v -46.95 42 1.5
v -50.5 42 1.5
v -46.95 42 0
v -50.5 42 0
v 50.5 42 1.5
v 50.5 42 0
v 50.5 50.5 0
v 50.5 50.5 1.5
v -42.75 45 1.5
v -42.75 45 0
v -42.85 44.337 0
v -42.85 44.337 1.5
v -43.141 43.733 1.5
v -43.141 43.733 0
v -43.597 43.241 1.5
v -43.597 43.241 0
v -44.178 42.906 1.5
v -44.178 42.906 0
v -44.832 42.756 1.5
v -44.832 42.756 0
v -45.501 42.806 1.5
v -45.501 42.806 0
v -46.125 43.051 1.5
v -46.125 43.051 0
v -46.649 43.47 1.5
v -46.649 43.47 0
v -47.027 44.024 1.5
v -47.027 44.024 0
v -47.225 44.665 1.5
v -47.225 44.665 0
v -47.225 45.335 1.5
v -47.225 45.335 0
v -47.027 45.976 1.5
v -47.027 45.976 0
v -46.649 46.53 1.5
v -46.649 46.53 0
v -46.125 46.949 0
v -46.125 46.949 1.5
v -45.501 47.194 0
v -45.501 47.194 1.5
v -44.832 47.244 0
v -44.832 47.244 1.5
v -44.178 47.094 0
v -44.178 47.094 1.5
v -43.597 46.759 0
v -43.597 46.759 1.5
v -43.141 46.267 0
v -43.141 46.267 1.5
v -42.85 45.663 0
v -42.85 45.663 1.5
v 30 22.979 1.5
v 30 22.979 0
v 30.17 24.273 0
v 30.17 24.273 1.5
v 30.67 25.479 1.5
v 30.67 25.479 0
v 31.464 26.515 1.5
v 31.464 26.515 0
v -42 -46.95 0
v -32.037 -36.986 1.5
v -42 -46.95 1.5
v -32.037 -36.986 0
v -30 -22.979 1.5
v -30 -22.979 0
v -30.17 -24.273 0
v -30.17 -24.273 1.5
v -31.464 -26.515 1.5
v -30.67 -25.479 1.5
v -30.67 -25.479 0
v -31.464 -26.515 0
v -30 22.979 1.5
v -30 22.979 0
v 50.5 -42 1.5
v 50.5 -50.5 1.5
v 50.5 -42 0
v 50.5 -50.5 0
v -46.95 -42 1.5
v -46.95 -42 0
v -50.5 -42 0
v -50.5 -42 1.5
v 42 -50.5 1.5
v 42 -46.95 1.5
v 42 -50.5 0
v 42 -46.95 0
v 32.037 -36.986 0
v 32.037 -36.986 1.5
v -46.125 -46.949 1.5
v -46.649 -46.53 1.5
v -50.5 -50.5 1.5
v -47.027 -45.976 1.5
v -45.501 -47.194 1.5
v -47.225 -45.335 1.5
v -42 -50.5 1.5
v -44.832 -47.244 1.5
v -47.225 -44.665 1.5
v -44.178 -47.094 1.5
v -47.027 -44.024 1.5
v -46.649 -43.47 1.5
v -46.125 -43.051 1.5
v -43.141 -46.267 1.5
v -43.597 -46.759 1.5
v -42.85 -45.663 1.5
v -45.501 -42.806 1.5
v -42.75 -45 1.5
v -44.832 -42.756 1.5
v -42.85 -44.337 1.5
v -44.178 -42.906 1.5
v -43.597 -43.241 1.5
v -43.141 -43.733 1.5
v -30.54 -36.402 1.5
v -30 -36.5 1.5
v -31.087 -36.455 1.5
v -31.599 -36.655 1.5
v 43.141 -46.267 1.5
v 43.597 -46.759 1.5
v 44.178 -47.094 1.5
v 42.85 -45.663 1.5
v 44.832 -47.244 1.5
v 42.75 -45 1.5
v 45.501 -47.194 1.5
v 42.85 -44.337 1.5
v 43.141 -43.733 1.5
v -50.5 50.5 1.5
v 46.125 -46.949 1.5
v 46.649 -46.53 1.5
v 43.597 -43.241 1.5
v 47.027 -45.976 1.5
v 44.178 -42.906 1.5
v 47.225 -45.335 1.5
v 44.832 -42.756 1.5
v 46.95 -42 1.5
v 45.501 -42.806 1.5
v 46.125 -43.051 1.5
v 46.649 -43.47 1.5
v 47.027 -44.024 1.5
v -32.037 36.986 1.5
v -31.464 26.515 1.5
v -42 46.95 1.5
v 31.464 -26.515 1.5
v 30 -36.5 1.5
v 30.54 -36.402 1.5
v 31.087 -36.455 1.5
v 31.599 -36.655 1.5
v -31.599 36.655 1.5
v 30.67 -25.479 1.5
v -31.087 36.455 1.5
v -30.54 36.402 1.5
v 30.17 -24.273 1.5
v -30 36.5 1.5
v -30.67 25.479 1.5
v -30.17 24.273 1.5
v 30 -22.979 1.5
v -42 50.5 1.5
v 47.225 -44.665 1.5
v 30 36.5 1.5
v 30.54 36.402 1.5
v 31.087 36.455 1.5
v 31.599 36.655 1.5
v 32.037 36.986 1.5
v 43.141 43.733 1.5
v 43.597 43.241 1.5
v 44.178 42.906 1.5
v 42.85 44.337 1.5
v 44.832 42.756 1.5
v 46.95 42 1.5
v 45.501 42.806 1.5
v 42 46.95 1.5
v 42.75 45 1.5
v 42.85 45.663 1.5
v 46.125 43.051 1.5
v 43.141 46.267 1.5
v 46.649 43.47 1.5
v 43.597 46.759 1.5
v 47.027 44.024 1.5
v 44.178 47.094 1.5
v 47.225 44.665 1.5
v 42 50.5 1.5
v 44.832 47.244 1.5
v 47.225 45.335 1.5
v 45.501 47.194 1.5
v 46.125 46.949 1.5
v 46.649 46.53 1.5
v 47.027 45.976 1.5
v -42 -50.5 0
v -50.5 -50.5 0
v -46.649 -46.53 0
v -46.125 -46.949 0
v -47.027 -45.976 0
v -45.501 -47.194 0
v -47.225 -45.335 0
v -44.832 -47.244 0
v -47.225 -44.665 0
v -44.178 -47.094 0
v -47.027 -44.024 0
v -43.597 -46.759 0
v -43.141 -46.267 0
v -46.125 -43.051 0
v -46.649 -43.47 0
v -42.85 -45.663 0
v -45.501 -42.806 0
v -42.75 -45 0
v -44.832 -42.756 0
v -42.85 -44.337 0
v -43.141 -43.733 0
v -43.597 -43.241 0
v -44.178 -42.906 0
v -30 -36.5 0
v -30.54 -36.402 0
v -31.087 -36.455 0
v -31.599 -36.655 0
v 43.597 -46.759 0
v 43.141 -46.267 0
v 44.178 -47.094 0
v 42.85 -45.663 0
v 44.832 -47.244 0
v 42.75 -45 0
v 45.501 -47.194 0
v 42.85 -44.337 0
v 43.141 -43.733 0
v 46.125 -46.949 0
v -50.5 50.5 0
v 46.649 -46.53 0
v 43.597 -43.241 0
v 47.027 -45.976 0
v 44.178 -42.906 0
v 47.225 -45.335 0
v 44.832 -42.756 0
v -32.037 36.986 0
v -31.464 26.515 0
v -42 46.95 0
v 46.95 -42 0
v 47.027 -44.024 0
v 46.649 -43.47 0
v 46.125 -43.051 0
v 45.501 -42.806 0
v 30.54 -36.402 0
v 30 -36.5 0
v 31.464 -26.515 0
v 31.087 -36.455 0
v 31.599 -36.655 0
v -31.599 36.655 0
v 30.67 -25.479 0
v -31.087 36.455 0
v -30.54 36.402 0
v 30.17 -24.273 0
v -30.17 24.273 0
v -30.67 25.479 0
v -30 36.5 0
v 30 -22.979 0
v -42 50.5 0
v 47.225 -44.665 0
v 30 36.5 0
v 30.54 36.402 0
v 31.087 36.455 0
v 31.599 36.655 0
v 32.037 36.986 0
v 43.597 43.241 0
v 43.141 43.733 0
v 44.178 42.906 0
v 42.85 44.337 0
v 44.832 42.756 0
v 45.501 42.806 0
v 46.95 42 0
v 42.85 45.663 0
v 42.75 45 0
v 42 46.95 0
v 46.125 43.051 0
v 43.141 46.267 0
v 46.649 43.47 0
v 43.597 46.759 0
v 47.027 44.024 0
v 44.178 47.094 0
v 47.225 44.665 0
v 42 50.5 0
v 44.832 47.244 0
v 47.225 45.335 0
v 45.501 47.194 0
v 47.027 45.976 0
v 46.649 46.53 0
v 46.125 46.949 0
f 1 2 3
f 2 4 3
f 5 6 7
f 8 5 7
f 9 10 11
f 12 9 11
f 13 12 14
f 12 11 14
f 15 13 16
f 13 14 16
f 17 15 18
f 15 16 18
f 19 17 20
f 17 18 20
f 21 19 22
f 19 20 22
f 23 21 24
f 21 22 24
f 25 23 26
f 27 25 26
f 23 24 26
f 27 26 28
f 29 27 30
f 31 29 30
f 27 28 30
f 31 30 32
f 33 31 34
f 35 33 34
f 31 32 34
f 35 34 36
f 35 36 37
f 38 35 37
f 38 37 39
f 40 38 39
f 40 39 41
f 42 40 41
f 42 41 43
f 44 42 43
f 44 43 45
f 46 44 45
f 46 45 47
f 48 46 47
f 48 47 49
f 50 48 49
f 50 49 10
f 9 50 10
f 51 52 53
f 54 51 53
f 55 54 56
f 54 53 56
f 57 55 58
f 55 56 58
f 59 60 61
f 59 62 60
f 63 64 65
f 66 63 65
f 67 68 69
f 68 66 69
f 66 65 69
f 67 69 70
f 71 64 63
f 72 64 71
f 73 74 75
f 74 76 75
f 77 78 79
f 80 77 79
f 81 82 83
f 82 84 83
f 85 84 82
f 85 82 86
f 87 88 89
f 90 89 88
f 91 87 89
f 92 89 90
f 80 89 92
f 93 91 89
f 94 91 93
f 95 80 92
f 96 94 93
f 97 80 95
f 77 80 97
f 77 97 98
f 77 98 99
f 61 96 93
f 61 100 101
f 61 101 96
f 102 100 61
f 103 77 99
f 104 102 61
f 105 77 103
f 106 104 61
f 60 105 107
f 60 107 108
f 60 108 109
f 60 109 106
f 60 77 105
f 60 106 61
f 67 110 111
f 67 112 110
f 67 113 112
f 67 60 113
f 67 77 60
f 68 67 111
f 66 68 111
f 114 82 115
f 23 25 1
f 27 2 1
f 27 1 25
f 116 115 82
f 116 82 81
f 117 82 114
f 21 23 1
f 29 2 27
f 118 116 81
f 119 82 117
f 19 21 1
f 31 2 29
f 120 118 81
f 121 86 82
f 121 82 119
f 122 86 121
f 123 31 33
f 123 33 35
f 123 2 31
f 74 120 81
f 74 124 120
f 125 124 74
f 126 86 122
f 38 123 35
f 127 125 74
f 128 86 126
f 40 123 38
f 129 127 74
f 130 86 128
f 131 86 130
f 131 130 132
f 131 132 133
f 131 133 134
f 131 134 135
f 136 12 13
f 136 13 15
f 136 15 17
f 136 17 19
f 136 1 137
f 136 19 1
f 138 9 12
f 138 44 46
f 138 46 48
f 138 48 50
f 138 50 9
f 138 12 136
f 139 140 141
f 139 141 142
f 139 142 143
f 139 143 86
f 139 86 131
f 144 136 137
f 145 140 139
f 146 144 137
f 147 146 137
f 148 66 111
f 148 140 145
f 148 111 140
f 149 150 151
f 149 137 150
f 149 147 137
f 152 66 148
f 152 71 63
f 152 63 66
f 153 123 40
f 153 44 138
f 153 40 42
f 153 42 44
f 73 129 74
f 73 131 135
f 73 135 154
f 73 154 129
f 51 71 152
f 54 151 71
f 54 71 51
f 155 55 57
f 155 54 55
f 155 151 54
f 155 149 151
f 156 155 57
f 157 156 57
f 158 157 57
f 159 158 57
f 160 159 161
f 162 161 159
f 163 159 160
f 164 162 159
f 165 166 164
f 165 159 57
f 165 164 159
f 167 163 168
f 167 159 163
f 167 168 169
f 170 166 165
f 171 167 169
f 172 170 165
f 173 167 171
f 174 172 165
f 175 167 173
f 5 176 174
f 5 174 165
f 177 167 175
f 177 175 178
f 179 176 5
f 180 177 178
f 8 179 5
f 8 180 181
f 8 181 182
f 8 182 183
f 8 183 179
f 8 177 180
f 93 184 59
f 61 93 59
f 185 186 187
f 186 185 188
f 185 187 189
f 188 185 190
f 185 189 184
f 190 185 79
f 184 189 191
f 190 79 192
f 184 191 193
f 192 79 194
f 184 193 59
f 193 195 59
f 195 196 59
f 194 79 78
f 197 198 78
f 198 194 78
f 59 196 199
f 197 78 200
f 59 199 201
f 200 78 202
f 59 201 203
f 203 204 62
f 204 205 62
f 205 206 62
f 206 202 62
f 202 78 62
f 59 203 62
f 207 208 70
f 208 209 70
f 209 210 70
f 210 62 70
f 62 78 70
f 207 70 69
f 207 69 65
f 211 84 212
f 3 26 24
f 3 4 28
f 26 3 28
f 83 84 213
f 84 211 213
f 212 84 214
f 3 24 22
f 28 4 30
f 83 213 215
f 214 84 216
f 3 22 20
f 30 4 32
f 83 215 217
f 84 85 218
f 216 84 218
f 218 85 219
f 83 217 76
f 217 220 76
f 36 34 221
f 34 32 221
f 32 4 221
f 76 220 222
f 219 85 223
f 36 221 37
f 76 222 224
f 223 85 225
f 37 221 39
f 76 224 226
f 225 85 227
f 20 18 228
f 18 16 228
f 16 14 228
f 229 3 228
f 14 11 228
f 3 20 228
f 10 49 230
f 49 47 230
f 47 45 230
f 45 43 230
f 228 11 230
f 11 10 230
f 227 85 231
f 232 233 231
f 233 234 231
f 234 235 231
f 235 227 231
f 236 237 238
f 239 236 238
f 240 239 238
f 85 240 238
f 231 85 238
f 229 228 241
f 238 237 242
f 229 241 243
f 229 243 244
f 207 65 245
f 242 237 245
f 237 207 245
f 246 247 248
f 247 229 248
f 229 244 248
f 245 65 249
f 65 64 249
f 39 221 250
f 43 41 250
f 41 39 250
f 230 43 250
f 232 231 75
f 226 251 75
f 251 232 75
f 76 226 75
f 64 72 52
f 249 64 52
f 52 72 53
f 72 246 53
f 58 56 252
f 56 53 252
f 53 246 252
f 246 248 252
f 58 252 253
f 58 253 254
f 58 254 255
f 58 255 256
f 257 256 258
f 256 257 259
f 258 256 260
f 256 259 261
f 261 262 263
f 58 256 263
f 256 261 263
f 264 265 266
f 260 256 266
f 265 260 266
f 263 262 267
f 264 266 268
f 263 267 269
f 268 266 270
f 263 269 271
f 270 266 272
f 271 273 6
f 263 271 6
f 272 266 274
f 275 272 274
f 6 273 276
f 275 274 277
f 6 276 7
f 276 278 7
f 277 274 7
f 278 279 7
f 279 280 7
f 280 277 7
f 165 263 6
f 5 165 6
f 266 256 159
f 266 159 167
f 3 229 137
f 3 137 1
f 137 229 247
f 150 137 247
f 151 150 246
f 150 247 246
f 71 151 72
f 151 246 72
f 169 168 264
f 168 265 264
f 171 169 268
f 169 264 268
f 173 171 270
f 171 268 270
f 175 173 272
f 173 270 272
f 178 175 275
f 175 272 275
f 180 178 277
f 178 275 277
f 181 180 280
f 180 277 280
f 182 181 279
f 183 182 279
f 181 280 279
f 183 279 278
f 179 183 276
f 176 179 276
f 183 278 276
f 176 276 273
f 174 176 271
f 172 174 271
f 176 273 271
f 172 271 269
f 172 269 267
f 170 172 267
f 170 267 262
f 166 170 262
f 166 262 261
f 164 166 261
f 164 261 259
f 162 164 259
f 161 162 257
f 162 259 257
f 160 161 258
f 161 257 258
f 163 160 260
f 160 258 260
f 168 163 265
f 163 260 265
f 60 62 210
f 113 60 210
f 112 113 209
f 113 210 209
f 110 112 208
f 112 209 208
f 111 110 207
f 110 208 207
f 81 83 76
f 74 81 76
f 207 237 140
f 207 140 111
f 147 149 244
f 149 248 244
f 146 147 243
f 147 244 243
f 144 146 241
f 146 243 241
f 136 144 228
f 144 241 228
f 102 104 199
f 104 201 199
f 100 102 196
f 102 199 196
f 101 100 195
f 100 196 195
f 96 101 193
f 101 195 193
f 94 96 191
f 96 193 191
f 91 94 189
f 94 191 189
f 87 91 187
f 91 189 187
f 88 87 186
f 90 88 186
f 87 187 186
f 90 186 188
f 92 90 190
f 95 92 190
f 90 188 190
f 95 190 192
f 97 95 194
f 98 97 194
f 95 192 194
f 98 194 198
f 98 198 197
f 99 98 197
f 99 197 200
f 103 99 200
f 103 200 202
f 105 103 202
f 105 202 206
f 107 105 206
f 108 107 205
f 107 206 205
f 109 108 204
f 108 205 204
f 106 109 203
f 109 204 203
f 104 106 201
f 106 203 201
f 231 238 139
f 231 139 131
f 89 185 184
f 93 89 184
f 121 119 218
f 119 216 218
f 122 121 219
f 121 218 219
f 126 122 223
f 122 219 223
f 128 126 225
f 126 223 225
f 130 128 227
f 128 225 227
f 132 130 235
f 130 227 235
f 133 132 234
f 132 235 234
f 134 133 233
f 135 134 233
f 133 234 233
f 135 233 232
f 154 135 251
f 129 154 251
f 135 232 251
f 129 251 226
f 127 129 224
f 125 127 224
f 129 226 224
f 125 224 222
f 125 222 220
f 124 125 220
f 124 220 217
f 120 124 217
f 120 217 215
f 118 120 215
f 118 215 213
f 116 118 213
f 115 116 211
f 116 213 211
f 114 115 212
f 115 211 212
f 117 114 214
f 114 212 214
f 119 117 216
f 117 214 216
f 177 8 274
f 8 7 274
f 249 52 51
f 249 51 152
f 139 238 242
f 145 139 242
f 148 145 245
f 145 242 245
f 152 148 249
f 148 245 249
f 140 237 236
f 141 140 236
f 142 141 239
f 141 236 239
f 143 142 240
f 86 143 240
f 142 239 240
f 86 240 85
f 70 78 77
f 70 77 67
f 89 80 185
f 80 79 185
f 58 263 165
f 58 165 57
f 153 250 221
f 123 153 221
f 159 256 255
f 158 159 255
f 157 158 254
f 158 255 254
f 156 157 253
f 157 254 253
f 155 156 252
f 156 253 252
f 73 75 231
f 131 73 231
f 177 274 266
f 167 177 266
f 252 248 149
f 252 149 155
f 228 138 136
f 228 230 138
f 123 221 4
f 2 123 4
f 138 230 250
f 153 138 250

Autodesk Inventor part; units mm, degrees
ref_plane "YZ Plane" through (0, 0, 0) normal (1, 0, 0) x (0, 1, 0)
ref_plane "XZ Plane" through (0, 0, 0) normal (0, 1, 0) x (-1, 0, 0)
ref_plane "XY Plane" through (0, 0, 0) normal (0, 0, 1) x (1, 0, 0)
sketch "Sketch1" plane through (0, 0, 0) normal (0, 0, 1) x (1, 0, 0)
  line L0 (-48, 48) -> (48, 48) construction
  line L1 (48, 48) -> (48, -48) construction
  line L2 (48, -48) -> (-48, -48) construction
  line L3 (-48, -48) -> (-48, 48) construction
  circle A0 centre (-45, 45) radius 2.25
  circle A1 centre (45, 45) radius 2.25
  line L4 (45, 45) -> (-45, 45) construction
  line L5 (-45, 45) -> (-45, -45) construction
  line L6 (-45, -45) -> (45, -45) construction
  line L7 (45, -45) -> (45, 45) construction
  circle A2 centre (45, -45) radius 2.25
  circle A3 centre (-45, -45) radius 2.25
  line L8 (-50.5, -50.5) -> (-42, -50.5)
  line L9 (-42, -50.5) -> (-42, -42)
  line L10 (-42, -42) -> (-50.5, -42)
  line L11 (-50.5, -42) -> (-50.5, -50.5)
  line L12 (0, 0) -> (-48, -48) construction
  line L13 (-30, 36.5) -> (30, 36.5)
  line L14 (30, 36.5) -> (30, -36.5)
  line L15 (30, -36.5) -> (-30, -36.5)
  line L16 (-30, -36.5) -> (-30, 36.5)
  line L17 (-2.4749, 2.4749) -> (2.4749, -2.4749)
  line L18 (2.4749, -2.4749) -> (-42.5251, -47.4749)
  line L19 (-42.5251, -47.4749) -> (-47.4749, -42.5251)
  line L20 (-47.4749, -42.5251) -> (-2.4749, 2.4749)
  line L21 (0, 0) -> (-45, -45) construction
  point P0 (0, 48)
  point P1 (48, 0)
  point P2 (30, 0)
  point P3 (0, 36.5)
  dimension "d0" = 96
  dimension "d1" = 96
  dimension "d2" = 4.5
  dimension "d3" = 4.5
  dimension "d4" = 3
  dimension "d5" = 4.5
  dimension "d6" = 4.5
  dimension "d9" = 3
  dimension "d10" = 3
  dimension "d11" = 60
  dimension "d12" = 73
  dimension "d13" = 7
  dimension "d14" = 0
  dimension "d23" = 5.5
  dimension "d24" = 5.5
extrude "Extrusion1" add sketch "Sketch1" along normal blind 1.5 contours L20 L17 L18 L16 | L16 L13 L14 L15 L18 L17 L20
extrude "Extrusion2" add sketch "Sketch1" along normal blind 1.5 contours A3 L19 | A3 L19 L20 L10 L9 L18 | A3 L19 L18 L9 L8 L11 L10 L20 | L20 L16 L18 L9 L10 | L20 L17 L18 L16 picked at (-45.2318, -44.2867)
extrude "Extrusion3" cut sketch "Sketch1" along normal blind 10 contours A3 L19 | L19 A3
mirror "Mirror1" about plane through (0, 0, 0) normal (1, 0, 0) of "Extrusion2", "Extrusion3"
mirror "Mirror2" about plane through (0, 0, 0) normal (0, 1, 0) of "Extrusion2", "Extrusion3", "Mirror1"
fillet "Fillet1" radius 2 4 edges at (-30, 34.9497, 0.75) (30, 34.9497, 0.75) (30, -34.9497, 0.75) (-30, -34.9497, 0.75)
fillet "Fillet2" radius 5 4 edges at (-30, -25.0503, 0.75) (-30, 25.0503, 0.75) (30, 25.0503, 0.75) (30, -25.0503, 0.75)
properties part number "BattHolder"
